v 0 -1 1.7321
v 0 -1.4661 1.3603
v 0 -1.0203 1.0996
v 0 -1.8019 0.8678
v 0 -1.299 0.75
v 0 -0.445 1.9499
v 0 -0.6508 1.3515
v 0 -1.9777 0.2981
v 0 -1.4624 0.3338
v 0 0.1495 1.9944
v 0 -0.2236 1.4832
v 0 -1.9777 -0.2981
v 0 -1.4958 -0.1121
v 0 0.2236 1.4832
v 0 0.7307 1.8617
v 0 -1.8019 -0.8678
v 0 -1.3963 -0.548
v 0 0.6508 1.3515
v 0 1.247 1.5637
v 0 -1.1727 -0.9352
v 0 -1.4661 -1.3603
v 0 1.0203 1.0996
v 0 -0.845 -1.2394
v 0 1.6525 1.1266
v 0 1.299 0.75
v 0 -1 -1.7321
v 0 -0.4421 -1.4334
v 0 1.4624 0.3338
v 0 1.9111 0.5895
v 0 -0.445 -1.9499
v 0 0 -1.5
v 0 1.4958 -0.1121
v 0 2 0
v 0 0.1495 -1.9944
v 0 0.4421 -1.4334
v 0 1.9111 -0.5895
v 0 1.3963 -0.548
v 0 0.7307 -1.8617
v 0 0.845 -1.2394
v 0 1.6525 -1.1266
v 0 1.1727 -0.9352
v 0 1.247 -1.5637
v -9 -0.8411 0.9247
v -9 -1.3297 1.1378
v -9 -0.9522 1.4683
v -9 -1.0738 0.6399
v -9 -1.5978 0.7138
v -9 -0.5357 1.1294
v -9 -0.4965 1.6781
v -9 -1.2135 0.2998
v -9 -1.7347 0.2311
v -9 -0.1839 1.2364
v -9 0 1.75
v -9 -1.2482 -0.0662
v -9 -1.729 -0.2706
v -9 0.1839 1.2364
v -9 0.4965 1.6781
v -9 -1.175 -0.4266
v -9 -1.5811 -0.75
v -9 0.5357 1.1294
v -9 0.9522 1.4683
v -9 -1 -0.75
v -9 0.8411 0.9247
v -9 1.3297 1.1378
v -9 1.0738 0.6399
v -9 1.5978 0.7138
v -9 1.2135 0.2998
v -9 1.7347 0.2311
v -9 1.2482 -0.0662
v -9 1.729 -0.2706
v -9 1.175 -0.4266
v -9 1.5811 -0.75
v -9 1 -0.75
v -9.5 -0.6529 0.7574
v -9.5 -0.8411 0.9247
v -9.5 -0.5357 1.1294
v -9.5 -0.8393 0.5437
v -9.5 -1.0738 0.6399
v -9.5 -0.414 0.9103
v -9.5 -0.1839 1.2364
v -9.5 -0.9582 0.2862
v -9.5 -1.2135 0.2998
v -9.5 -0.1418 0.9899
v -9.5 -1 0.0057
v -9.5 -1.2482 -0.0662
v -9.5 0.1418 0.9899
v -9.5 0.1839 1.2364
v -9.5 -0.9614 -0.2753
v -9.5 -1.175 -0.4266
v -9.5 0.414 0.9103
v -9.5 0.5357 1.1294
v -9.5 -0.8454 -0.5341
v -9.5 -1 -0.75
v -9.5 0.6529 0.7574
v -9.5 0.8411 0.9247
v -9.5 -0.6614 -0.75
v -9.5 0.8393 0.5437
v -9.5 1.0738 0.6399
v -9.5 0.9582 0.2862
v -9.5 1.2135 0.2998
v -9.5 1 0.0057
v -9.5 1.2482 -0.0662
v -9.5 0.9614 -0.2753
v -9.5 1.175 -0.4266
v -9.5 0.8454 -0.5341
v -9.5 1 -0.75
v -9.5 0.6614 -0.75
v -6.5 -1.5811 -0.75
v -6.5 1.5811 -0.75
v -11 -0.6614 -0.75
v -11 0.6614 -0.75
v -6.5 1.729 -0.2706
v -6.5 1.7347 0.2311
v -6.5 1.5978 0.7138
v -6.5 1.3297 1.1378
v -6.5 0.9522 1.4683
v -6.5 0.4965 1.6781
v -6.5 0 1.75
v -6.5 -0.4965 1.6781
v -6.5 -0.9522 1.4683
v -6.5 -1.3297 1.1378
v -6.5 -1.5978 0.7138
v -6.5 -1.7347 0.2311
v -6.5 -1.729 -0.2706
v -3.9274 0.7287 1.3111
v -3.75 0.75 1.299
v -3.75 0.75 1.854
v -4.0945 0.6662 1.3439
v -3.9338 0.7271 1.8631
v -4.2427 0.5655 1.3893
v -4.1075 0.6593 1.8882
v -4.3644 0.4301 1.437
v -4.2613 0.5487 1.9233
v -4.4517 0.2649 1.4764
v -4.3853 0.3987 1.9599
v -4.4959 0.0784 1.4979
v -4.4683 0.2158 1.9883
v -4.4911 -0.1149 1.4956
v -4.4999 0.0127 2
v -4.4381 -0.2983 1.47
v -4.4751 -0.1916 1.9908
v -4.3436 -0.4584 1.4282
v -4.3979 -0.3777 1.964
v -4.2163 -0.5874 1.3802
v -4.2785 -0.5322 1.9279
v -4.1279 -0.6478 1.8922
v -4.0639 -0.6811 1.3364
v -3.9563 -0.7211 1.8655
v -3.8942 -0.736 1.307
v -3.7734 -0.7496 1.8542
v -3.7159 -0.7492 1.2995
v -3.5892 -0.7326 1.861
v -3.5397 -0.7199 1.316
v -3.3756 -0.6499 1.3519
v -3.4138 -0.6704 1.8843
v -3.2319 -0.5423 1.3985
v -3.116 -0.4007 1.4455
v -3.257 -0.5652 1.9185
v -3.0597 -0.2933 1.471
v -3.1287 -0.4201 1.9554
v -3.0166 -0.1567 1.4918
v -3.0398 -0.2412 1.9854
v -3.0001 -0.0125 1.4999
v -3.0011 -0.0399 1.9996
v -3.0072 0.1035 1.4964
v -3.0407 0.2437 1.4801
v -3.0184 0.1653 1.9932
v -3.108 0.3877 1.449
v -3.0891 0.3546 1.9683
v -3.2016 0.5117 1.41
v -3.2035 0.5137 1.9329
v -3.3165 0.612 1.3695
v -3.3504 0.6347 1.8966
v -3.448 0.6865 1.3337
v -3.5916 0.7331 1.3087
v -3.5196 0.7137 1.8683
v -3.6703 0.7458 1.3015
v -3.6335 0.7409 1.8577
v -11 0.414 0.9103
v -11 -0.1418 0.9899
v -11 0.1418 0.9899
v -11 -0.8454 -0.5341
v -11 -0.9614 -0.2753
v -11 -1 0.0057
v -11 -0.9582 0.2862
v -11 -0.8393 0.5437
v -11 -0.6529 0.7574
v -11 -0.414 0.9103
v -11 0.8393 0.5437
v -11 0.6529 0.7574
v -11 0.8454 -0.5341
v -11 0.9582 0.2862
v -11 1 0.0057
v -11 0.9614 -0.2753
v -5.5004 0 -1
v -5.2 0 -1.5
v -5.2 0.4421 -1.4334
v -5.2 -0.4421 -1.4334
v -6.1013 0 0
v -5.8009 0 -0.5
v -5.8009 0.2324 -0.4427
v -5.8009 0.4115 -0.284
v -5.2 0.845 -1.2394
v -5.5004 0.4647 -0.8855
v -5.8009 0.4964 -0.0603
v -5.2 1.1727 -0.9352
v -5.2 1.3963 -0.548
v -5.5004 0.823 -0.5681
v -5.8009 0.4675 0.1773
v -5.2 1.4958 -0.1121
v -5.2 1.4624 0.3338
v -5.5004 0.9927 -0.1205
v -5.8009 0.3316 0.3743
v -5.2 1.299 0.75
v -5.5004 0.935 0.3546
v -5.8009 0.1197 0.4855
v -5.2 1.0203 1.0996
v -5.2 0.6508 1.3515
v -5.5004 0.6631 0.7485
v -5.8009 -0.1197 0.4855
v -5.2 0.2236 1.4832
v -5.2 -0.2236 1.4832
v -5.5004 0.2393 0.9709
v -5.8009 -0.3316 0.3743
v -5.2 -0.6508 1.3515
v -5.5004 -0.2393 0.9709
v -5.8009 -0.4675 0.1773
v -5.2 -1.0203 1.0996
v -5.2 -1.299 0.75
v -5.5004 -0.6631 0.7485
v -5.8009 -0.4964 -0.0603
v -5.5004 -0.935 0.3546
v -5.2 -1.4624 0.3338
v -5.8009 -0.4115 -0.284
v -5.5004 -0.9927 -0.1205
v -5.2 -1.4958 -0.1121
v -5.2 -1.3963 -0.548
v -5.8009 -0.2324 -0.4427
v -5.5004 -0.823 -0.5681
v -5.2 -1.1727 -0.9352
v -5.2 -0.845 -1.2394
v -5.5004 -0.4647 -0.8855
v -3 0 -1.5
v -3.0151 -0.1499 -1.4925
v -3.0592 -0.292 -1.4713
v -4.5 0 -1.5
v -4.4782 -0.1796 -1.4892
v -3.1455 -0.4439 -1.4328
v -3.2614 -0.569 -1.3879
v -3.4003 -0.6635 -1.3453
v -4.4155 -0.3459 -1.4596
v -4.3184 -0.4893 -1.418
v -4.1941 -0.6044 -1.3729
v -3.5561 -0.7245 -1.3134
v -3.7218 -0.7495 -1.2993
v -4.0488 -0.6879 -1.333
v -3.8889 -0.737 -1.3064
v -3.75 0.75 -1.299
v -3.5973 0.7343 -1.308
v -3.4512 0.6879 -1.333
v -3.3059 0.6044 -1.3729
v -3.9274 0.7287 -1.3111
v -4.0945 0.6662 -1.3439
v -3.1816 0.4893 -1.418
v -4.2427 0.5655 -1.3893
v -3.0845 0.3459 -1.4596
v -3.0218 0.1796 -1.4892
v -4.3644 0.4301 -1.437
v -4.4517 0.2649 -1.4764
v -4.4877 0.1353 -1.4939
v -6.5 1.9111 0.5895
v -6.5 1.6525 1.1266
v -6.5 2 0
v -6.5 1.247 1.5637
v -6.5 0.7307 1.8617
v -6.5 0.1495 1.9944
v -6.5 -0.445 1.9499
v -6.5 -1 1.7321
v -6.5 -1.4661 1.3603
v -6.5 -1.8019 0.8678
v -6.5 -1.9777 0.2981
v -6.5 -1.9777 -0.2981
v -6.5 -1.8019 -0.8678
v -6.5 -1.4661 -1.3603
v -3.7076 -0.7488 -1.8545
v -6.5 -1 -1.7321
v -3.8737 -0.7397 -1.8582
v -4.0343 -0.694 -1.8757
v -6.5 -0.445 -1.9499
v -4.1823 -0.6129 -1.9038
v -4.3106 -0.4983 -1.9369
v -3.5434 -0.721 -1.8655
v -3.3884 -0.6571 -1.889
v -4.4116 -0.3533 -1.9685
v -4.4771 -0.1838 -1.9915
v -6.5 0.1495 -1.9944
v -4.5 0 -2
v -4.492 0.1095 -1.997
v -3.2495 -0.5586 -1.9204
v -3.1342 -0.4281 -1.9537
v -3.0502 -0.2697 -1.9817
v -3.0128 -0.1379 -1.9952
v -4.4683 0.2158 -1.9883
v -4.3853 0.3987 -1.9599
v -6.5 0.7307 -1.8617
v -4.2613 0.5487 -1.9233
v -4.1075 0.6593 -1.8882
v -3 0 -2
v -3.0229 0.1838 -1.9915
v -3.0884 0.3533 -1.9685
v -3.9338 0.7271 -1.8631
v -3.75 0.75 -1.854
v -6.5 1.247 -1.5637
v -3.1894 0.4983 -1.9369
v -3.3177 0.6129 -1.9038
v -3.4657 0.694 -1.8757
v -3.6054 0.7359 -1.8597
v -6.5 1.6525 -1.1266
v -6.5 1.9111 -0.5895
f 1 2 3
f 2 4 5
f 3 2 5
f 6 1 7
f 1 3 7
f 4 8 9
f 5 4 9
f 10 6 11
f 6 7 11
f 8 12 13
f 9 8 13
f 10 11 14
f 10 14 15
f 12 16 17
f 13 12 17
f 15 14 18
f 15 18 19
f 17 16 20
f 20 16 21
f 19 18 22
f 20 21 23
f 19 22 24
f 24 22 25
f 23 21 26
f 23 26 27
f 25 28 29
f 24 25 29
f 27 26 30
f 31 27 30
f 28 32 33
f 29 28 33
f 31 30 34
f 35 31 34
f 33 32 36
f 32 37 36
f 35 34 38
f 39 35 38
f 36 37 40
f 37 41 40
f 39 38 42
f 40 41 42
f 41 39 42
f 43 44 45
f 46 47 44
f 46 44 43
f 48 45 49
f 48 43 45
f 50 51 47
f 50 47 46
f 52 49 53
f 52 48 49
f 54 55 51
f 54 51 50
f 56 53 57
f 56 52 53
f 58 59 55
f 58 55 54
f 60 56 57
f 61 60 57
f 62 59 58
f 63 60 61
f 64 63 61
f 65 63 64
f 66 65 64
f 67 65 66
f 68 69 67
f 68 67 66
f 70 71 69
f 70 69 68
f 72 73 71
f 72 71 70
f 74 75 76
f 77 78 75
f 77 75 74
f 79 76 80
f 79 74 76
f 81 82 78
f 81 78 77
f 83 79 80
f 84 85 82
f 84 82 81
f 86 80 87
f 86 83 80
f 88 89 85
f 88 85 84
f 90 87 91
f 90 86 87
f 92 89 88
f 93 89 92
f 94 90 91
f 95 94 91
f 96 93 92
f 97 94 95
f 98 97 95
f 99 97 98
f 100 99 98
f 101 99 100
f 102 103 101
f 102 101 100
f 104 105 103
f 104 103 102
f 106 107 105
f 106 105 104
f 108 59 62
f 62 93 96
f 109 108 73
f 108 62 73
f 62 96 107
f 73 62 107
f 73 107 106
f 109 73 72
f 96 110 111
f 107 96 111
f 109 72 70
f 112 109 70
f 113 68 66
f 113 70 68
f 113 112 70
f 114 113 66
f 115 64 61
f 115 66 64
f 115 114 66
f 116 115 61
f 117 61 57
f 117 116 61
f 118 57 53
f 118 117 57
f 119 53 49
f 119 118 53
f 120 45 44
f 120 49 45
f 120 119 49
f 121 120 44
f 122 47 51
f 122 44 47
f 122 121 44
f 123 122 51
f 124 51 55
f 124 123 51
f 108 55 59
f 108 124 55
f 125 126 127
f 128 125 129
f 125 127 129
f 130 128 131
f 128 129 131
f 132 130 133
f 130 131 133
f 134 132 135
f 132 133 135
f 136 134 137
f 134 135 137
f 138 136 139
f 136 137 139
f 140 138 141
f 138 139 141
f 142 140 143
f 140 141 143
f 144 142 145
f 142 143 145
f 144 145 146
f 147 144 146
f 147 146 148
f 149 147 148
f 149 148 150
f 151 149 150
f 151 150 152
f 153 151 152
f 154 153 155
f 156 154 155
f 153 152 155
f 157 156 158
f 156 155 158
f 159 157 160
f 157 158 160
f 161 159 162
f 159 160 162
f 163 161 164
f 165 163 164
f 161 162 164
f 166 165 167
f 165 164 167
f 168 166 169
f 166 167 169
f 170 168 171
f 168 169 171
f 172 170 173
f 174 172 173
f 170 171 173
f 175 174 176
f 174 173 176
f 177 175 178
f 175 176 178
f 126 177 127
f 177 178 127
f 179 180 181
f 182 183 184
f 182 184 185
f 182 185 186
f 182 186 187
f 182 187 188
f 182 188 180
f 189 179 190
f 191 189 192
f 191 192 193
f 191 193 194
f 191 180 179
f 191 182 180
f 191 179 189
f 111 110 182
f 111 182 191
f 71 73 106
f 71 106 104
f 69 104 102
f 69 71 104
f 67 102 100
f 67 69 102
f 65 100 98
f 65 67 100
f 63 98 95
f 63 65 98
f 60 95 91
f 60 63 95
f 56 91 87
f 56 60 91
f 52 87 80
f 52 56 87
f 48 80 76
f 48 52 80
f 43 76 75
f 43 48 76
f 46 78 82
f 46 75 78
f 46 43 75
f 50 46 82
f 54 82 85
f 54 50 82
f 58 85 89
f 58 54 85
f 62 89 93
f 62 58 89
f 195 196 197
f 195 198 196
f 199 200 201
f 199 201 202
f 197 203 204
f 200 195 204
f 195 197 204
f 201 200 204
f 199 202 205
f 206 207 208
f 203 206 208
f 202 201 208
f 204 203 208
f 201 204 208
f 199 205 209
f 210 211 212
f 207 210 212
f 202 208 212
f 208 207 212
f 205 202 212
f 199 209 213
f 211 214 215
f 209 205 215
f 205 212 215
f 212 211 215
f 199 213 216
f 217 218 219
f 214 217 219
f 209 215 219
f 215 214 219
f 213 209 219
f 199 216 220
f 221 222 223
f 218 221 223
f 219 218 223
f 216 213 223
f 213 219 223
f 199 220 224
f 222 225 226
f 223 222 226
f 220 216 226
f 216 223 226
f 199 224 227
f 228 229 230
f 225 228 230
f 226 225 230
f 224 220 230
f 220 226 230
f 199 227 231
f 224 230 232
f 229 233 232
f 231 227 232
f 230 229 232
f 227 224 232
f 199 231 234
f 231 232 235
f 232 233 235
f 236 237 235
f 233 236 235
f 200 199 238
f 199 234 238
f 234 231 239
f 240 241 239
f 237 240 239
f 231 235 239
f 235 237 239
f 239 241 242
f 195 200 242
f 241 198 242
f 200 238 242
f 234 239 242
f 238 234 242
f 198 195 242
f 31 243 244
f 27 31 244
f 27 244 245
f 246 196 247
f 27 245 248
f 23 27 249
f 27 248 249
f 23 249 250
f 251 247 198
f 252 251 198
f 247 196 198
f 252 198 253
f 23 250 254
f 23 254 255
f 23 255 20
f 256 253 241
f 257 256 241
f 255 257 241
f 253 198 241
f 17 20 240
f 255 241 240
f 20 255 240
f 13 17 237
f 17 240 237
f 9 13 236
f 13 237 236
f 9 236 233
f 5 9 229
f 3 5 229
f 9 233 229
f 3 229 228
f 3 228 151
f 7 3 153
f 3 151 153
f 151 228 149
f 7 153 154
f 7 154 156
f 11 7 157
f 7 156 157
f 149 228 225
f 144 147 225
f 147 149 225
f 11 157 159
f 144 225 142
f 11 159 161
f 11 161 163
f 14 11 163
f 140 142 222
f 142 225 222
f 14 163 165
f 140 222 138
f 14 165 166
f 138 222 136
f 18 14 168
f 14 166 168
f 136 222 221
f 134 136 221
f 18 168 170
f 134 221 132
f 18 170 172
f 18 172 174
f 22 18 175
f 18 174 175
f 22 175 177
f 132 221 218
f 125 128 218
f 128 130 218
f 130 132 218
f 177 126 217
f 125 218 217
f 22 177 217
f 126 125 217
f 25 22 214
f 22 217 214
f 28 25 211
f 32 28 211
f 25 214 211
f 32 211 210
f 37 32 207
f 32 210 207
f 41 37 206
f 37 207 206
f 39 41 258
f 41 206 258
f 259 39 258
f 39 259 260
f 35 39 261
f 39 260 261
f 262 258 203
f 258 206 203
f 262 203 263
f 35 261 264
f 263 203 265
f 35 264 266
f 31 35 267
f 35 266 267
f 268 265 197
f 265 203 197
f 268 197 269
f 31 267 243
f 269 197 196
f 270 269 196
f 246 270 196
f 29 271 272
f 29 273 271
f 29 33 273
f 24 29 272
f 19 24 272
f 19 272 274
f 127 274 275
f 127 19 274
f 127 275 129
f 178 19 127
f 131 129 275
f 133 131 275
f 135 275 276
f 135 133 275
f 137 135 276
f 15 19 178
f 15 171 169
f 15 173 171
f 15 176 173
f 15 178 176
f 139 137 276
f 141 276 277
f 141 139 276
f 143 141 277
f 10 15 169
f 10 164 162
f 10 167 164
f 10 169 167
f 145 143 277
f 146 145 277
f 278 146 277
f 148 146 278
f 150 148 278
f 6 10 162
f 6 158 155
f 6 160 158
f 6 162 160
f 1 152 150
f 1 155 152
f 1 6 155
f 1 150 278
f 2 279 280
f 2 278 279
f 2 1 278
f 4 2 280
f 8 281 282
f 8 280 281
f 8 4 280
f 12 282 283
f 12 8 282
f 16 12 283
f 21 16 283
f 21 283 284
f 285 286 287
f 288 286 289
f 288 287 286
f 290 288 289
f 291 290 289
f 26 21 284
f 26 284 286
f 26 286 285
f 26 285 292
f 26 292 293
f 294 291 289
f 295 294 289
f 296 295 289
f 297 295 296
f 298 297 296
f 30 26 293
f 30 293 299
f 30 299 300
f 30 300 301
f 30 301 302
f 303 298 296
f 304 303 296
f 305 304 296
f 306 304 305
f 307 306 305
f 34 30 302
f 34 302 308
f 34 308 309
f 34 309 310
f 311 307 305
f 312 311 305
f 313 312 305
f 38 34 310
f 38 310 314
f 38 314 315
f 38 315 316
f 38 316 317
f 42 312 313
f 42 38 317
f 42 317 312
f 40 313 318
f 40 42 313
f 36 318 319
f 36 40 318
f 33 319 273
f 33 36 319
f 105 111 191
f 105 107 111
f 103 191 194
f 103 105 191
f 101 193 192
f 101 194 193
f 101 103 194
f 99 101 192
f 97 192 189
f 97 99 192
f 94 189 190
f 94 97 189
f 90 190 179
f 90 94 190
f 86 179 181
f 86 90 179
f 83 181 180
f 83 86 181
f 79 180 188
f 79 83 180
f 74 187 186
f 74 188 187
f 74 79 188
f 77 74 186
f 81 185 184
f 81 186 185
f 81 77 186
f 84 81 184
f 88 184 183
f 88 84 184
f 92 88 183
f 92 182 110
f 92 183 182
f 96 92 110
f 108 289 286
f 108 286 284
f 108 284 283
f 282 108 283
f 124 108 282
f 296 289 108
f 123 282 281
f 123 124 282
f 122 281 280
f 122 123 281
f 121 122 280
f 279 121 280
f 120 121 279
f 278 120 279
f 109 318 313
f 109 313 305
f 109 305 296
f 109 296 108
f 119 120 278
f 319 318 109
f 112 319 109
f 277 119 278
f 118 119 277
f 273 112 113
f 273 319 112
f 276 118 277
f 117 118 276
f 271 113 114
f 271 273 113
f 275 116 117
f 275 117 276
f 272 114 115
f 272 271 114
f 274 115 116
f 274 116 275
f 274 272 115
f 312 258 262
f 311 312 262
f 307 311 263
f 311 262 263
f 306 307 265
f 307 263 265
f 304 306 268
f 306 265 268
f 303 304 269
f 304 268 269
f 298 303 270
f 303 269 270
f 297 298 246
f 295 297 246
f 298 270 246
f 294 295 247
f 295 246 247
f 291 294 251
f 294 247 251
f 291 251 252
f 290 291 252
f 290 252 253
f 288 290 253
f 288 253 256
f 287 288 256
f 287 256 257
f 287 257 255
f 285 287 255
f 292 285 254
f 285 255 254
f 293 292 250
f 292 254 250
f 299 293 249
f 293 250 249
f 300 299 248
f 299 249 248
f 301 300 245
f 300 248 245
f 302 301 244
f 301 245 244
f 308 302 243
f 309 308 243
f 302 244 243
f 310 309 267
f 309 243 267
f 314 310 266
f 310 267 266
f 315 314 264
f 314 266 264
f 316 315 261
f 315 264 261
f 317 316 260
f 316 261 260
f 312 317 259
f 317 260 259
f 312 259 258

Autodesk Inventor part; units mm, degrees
ref_plane "YZ Plane" through (0, 0, 0) normal (1, 0, 0) x (0, 1, 0)
ref_plane "XZ Plane" through (0, 0, 0) normal (0, 1, 0) x (-1, 0, 0)
sketch "Sketch1" plane through (0, 0, 0) normal (0, 0, 1) x (1, 0, 0)
  line L0 (0, 0) -> (-11, 0)
  line L1 (-11, 0) -> (-11, 1)
  line L2 (-11, 1) -> (-9.5, 1)
  line L3 (-9.5, 1) -> (-9.5, 1.25)
  line L4 (-9.5, 1.25) -> (-9, 1.25)
  line L5 (-9, 1.25) -> (-9, 1.75)
  line L6 (-9, 1.75) -> (-6.5, 1.75)
  line L7 (-6.5, 1.75) -> (-6.5, 2)
  line L8 (-6.5, 2) -> (0, 2)
  line L9 (0, 2) -> (0, 0)
  dimension "d1" = 4
  dimension "d2" = 2
  dimension "d3" = 2.5
  dimension "d4" = 3.5
  dimension "d7" = 2.5
  dimension "d8" = 0.5
  dimension "d9" = 1.5
  dimension "d23" = 6.5
revolve "Revolution1" add sketch "Sketch1" angle 360 about axis through (0, 0, 0) along (-1, 0, 0)
hole "motor shaft" at (0, 0, 0) direction (-1, 0, 0) diameter 3 depth 5.2 tip angle 118
sketch "Sketch2" plane through (-11, 0, 0) normal (-1, 0, 0) x (0, 0, 1)
  circle A0 centre (0, 0) radius 2 projected
  line L0 (-0.75, -1.854) -> (-0.75, 1.854)
  dimension "d11" = 0.75
extrude "D" cut sketch "Sketch2" against normal up to surface (4.5 mm away) contours L0 A0 picked at (-1.1667, 0)
ref_plane "Work Plane1" through (-3.25, 0, -2) normal (0, 0, 1) x (1, 0, 0)
sketch "Sketch3" plane through (-3.25, 0, -2) normal (0, 0, 1) x (1, 0, 0)
  point P0 (3.25, 0)
  point P1 (-0.5, 0)
  dimension "d14" = 3.75
hole "Hole1" at (-3.75, 0, -2) direction (0, 0, 1) diameter 1.5 end through all
properties part number "drive shaft" material "Stainless Steel"
